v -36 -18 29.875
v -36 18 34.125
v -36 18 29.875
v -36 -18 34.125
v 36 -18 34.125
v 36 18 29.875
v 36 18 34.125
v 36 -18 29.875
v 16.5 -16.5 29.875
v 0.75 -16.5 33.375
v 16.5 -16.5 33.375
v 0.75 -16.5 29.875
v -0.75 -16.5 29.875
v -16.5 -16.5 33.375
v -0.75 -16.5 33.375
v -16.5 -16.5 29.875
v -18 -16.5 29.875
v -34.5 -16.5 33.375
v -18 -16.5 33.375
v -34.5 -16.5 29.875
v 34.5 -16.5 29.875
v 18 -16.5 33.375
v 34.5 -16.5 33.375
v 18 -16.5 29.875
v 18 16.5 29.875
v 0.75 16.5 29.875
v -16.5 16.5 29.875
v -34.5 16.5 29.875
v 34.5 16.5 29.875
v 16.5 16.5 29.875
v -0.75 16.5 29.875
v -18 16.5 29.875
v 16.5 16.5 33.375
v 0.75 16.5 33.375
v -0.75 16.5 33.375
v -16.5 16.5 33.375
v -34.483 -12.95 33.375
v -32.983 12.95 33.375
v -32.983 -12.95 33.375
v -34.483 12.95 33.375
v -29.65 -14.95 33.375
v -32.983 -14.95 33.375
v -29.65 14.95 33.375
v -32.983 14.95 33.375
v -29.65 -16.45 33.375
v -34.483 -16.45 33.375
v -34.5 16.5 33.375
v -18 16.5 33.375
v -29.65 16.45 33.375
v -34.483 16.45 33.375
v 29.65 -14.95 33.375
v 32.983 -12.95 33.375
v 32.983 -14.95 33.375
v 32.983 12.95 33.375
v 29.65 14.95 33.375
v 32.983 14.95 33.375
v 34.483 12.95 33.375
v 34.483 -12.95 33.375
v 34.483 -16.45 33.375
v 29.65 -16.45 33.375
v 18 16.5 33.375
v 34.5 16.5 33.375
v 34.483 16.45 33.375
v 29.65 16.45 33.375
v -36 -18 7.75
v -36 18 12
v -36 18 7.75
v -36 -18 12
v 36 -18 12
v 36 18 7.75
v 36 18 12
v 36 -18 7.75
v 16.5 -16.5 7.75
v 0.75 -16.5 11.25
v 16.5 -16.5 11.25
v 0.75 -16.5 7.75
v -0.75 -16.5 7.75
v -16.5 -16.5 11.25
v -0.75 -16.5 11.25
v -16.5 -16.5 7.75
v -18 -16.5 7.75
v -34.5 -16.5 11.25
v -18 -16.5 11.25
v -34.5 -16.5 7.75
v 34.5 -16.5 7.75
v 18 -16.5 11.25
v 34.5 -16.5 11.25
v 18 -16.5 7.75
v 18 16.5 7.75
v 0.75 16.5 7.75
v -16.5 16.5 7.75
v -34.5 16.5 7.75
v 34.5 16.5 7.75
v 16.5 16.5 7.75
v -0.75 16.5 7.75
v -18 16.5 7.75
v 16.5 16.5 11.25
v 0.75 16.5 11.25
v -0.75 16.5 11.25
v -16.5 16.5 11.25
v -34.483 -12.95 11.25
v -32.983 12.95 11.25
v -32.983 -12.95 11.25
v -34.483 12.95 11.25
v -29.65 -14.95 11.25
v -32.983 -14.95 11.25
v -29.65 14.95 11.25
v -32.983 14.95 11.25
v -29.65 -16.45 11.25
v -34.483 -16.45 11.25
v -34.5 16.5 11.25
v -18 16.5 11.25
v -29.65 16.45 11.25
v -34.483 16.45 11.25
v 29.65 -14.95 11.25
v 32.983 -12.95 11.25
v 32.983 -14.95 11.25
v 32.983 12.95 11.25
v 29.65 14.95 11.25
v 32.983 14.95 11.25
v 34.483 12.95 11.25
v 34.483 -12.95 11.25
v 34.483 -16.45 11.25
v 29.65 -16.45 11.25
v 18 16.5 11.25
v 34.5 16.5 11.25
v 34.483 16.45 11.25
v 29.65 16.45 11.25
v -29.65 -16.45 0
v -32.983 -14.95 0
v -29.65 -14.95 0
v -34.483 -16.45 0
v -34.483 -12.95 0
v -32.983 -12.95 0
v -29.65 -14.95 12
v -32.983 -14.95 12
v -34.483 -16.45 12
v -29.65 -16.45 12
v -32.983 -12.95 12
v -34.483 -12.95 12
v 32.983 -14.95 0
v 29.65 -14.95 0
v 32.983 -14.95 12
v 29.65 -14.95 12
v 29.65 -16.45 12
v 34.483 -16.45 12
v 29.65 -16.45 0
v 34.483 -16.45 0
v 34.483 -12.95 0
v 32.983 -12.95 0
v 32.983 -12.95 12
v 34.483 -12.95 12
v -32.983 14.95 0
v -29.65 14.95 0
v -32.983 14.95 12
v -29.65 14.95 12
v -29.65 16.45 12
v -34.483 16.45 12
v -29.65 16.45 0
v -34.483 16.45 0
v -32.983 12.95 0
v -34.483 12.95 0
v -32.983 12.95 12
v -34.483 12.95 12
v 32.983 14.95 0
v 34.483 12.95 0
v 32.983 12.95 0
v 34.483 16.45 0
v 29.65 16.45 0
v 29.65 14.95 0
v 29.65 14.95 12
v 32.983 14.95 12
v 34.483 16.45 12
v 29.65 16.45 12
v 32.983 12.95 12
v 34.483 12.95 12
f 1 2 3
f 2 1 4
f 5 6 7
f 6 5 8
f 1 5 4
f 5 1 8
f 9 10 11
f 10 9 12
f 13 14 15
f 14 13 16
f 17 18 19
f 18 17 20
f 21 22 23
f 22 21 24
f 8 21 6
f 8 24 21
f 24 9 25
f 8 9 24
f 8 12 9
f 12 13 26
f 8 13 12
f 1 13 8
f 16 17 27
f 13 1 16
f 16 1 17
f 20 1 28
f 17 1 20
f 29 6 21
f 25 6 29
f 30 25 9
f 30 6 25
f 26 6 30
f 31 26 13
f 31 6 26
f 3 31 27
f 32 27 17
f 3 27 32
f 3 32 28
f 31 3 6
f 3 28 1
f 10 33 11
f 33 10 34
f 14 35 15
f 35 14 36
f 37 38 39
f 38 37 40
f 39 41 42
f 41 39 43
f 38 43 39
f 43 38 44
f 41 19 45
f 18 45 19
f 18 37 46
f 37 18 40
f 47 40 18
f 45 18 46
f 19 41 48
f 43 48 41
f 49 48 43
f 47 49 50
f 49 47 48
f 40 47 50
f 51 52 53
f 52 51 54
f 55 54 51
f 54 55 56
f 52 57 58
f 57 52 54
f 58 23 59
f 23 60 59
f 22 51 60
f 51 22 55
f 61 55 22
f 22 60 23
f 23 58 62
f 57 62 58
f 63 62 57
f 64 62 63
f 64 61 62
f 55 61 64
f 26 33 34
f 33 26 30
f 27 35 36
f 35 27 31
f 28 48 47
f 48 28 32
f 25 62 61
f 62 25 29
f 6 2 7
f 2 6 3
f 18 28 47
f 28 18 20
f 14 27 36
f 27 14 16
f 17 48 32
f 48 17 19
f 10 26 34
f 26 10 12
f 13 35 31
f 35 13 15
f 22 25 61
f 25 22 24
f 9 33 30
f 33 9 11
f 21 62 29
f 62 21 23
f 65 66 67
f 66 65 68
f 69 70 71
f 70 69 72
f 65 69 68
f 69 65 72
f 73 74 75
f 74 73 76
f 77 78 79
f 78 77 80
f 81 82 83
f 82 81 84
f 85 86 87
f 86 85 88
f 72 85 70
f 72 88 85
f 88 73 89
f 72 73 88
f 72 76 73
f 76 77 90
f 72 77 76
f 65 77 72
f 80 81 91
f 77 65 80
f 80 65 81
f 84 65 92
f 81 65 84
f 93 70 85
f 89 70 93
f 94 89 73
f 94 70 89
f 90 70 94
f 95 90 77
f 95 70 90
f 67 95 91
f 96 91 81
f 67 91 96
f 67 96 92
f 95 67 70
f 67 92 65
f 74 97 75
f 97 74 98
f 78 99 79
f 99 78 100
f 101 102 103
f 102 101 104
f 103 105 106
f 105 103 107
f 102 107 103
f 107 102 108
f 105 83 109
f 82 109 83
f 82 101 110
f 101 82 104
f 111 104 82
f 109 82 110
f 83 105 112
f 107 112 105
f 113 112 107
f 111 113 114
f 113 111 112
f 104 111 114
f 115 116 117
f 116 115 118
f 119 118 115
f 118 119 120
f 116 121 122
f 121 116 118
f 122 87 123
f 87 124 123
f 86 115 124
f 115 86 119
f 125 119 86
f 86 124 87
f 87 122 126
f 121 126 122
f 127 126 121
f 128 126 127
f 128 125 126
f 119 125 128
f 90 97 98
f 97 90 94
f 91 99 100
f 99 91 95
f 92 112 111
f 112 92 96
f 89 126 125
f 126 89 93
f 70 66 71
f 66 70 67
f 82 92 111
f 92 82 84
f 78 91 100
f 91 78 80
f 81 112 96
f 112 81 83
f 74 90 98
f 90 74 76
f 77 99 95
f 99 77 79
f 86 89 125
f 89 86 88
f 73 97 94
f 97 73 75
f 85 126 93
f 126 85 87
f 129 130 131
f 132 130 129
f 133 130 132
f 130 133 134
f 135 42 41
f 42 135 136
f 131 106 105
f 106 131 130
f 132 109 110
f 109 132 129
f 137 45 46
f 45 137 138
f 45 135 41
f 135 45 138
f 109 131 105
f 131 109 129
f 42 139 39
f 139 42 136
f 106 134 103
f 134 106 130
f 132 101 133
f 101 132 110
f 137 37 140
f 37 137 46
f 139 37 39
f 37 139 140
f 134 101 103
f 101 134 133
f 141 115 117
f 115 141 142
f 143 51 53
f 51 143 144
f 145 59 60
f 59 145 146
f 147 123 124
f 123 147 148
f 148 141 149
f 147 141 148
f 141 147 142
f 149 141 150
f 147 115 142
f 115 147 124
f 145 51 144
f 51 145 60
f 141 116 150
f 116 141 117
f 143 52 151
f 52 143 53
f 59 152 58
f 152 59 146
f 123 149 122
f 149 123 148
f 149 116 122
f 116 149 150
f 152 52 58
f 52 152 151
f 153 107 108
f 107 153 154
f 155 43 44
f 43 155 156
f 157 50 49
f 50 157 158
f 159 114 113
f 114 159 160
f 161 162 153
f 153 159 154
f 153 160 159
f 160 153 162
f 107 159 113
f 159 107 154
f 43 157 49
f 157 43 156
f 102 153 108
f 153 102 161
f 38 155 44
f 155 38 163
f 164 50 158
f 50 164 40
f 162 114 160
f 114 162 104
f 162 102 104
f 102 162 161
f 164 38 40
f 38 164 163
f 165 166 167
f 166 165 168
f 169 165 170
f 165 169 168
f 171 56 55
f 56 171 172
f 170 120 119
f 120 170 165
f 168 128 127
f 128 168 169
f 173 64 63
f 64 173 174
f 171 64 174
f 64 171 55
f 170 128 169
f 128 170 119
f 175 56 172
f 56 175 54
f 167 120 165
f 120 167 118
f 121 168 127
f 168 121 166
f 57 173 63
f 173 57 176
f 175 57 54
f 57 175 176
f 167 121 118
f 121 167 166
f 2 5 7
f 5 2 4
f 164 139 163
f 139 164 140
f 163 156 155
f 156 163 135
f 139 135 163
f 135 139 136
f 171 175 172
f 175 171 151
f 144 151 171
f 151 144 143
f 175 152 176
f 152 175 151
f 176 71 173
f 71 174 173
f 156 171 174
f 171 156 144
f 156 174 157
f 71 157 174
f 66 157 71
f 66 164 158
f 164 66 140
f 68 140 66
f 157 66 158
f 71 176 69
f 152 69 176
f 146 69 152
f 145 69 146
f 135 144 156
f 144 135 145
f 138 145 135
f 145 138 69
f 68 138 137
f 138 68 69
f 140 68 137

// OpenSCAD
feet = 12;

table_width = feet * 6;
table_depth = feet * 3;
table_height = 34 + 1/8;
shelf_height = 12;
leg_height = table_height - 3/4;

module tbf(length, center = true) {
  cube([length, 3.5, 1.5], center);
};
module tbs(length, center = true) {
  cube([length, 5.5, 1.5], center);
};

module frame() { 
// front
  translate([0, -(table_depth / 2) + .75, 0])
  rotate([90, 0, 0])
  tbf(table_width);
// back
  translate([0, (table_depth / 2) - .75, 0])
  rotate([90, 0, 0])
  tbf(table_width);
// joists
  translate([-(table_width / 2) + .75, 0, 0])
  rotate([90, 0, 90])
  tbf(table_depth - 3);
  
  translate([-(table_width / 4) + .75, 0, 0])
  rotate([90, 0, 90])
  tbf(table_depth - 3);
  
  translate([0, 0, 0])
  rotate([90, 0, 90])
  tbf(table_depth - 3);
  
  translate([(table_width / 4) - .75, 0, 0])
  rotate([90, 0, 90])
  tbf(table_depth - 3);

  translate([(table_width / 2) - .75, 0, 0])
  rotate([90, 0, 90])
  tbf(table_depth - 3);
};

module leg() {
  //translate([2.3, 3.2, 1.5])
  rotate([0, 90, 0])
  tbf(leg_height);
  translate([1,2+1/3,0])
  rotate([90, 90, 0])
  tbf(leg_height);
};

// TOP
  translate([0, 0, leg_height - 1.75])
  frame();

// ply
   translate([0, 0, table_height - 3/8])
   cube([table_width, table_depth, 3/4], true);

// BOTTOM
  translate([0, 0, shelf_height - 1.75 - 3/4])
  frame();
 
// ply
   translate([0, 0, shelf_height - 3/8])
   cube([table_width, table_depth, 3/4], true);

leg_offset = 4.6;
  
  // legs
  translate([-table_width / 2 + leg_offset, -table_depth / 2 + leg_offset/2, leg_height / 2])
  rotate([0, 0, 90])
  leg();

  translate([table_width / 2 - leg_offset, -table_depth / 2 + leg_offset/2, leg_height / 2])
  rotate([180, 0, 90])
  leg();

  translate([-table_width / 2 + leg_offset, table_depth / 2 - leg_offset/2, leg_height / 2])
  rotate([180, 0, -90])
  leg();

  translate([table_width / 2 - leg_offset, table_depth / 2 - leg_offset/2, leg_height / 2])
  rotate([0, 0, -90])
  leg();
